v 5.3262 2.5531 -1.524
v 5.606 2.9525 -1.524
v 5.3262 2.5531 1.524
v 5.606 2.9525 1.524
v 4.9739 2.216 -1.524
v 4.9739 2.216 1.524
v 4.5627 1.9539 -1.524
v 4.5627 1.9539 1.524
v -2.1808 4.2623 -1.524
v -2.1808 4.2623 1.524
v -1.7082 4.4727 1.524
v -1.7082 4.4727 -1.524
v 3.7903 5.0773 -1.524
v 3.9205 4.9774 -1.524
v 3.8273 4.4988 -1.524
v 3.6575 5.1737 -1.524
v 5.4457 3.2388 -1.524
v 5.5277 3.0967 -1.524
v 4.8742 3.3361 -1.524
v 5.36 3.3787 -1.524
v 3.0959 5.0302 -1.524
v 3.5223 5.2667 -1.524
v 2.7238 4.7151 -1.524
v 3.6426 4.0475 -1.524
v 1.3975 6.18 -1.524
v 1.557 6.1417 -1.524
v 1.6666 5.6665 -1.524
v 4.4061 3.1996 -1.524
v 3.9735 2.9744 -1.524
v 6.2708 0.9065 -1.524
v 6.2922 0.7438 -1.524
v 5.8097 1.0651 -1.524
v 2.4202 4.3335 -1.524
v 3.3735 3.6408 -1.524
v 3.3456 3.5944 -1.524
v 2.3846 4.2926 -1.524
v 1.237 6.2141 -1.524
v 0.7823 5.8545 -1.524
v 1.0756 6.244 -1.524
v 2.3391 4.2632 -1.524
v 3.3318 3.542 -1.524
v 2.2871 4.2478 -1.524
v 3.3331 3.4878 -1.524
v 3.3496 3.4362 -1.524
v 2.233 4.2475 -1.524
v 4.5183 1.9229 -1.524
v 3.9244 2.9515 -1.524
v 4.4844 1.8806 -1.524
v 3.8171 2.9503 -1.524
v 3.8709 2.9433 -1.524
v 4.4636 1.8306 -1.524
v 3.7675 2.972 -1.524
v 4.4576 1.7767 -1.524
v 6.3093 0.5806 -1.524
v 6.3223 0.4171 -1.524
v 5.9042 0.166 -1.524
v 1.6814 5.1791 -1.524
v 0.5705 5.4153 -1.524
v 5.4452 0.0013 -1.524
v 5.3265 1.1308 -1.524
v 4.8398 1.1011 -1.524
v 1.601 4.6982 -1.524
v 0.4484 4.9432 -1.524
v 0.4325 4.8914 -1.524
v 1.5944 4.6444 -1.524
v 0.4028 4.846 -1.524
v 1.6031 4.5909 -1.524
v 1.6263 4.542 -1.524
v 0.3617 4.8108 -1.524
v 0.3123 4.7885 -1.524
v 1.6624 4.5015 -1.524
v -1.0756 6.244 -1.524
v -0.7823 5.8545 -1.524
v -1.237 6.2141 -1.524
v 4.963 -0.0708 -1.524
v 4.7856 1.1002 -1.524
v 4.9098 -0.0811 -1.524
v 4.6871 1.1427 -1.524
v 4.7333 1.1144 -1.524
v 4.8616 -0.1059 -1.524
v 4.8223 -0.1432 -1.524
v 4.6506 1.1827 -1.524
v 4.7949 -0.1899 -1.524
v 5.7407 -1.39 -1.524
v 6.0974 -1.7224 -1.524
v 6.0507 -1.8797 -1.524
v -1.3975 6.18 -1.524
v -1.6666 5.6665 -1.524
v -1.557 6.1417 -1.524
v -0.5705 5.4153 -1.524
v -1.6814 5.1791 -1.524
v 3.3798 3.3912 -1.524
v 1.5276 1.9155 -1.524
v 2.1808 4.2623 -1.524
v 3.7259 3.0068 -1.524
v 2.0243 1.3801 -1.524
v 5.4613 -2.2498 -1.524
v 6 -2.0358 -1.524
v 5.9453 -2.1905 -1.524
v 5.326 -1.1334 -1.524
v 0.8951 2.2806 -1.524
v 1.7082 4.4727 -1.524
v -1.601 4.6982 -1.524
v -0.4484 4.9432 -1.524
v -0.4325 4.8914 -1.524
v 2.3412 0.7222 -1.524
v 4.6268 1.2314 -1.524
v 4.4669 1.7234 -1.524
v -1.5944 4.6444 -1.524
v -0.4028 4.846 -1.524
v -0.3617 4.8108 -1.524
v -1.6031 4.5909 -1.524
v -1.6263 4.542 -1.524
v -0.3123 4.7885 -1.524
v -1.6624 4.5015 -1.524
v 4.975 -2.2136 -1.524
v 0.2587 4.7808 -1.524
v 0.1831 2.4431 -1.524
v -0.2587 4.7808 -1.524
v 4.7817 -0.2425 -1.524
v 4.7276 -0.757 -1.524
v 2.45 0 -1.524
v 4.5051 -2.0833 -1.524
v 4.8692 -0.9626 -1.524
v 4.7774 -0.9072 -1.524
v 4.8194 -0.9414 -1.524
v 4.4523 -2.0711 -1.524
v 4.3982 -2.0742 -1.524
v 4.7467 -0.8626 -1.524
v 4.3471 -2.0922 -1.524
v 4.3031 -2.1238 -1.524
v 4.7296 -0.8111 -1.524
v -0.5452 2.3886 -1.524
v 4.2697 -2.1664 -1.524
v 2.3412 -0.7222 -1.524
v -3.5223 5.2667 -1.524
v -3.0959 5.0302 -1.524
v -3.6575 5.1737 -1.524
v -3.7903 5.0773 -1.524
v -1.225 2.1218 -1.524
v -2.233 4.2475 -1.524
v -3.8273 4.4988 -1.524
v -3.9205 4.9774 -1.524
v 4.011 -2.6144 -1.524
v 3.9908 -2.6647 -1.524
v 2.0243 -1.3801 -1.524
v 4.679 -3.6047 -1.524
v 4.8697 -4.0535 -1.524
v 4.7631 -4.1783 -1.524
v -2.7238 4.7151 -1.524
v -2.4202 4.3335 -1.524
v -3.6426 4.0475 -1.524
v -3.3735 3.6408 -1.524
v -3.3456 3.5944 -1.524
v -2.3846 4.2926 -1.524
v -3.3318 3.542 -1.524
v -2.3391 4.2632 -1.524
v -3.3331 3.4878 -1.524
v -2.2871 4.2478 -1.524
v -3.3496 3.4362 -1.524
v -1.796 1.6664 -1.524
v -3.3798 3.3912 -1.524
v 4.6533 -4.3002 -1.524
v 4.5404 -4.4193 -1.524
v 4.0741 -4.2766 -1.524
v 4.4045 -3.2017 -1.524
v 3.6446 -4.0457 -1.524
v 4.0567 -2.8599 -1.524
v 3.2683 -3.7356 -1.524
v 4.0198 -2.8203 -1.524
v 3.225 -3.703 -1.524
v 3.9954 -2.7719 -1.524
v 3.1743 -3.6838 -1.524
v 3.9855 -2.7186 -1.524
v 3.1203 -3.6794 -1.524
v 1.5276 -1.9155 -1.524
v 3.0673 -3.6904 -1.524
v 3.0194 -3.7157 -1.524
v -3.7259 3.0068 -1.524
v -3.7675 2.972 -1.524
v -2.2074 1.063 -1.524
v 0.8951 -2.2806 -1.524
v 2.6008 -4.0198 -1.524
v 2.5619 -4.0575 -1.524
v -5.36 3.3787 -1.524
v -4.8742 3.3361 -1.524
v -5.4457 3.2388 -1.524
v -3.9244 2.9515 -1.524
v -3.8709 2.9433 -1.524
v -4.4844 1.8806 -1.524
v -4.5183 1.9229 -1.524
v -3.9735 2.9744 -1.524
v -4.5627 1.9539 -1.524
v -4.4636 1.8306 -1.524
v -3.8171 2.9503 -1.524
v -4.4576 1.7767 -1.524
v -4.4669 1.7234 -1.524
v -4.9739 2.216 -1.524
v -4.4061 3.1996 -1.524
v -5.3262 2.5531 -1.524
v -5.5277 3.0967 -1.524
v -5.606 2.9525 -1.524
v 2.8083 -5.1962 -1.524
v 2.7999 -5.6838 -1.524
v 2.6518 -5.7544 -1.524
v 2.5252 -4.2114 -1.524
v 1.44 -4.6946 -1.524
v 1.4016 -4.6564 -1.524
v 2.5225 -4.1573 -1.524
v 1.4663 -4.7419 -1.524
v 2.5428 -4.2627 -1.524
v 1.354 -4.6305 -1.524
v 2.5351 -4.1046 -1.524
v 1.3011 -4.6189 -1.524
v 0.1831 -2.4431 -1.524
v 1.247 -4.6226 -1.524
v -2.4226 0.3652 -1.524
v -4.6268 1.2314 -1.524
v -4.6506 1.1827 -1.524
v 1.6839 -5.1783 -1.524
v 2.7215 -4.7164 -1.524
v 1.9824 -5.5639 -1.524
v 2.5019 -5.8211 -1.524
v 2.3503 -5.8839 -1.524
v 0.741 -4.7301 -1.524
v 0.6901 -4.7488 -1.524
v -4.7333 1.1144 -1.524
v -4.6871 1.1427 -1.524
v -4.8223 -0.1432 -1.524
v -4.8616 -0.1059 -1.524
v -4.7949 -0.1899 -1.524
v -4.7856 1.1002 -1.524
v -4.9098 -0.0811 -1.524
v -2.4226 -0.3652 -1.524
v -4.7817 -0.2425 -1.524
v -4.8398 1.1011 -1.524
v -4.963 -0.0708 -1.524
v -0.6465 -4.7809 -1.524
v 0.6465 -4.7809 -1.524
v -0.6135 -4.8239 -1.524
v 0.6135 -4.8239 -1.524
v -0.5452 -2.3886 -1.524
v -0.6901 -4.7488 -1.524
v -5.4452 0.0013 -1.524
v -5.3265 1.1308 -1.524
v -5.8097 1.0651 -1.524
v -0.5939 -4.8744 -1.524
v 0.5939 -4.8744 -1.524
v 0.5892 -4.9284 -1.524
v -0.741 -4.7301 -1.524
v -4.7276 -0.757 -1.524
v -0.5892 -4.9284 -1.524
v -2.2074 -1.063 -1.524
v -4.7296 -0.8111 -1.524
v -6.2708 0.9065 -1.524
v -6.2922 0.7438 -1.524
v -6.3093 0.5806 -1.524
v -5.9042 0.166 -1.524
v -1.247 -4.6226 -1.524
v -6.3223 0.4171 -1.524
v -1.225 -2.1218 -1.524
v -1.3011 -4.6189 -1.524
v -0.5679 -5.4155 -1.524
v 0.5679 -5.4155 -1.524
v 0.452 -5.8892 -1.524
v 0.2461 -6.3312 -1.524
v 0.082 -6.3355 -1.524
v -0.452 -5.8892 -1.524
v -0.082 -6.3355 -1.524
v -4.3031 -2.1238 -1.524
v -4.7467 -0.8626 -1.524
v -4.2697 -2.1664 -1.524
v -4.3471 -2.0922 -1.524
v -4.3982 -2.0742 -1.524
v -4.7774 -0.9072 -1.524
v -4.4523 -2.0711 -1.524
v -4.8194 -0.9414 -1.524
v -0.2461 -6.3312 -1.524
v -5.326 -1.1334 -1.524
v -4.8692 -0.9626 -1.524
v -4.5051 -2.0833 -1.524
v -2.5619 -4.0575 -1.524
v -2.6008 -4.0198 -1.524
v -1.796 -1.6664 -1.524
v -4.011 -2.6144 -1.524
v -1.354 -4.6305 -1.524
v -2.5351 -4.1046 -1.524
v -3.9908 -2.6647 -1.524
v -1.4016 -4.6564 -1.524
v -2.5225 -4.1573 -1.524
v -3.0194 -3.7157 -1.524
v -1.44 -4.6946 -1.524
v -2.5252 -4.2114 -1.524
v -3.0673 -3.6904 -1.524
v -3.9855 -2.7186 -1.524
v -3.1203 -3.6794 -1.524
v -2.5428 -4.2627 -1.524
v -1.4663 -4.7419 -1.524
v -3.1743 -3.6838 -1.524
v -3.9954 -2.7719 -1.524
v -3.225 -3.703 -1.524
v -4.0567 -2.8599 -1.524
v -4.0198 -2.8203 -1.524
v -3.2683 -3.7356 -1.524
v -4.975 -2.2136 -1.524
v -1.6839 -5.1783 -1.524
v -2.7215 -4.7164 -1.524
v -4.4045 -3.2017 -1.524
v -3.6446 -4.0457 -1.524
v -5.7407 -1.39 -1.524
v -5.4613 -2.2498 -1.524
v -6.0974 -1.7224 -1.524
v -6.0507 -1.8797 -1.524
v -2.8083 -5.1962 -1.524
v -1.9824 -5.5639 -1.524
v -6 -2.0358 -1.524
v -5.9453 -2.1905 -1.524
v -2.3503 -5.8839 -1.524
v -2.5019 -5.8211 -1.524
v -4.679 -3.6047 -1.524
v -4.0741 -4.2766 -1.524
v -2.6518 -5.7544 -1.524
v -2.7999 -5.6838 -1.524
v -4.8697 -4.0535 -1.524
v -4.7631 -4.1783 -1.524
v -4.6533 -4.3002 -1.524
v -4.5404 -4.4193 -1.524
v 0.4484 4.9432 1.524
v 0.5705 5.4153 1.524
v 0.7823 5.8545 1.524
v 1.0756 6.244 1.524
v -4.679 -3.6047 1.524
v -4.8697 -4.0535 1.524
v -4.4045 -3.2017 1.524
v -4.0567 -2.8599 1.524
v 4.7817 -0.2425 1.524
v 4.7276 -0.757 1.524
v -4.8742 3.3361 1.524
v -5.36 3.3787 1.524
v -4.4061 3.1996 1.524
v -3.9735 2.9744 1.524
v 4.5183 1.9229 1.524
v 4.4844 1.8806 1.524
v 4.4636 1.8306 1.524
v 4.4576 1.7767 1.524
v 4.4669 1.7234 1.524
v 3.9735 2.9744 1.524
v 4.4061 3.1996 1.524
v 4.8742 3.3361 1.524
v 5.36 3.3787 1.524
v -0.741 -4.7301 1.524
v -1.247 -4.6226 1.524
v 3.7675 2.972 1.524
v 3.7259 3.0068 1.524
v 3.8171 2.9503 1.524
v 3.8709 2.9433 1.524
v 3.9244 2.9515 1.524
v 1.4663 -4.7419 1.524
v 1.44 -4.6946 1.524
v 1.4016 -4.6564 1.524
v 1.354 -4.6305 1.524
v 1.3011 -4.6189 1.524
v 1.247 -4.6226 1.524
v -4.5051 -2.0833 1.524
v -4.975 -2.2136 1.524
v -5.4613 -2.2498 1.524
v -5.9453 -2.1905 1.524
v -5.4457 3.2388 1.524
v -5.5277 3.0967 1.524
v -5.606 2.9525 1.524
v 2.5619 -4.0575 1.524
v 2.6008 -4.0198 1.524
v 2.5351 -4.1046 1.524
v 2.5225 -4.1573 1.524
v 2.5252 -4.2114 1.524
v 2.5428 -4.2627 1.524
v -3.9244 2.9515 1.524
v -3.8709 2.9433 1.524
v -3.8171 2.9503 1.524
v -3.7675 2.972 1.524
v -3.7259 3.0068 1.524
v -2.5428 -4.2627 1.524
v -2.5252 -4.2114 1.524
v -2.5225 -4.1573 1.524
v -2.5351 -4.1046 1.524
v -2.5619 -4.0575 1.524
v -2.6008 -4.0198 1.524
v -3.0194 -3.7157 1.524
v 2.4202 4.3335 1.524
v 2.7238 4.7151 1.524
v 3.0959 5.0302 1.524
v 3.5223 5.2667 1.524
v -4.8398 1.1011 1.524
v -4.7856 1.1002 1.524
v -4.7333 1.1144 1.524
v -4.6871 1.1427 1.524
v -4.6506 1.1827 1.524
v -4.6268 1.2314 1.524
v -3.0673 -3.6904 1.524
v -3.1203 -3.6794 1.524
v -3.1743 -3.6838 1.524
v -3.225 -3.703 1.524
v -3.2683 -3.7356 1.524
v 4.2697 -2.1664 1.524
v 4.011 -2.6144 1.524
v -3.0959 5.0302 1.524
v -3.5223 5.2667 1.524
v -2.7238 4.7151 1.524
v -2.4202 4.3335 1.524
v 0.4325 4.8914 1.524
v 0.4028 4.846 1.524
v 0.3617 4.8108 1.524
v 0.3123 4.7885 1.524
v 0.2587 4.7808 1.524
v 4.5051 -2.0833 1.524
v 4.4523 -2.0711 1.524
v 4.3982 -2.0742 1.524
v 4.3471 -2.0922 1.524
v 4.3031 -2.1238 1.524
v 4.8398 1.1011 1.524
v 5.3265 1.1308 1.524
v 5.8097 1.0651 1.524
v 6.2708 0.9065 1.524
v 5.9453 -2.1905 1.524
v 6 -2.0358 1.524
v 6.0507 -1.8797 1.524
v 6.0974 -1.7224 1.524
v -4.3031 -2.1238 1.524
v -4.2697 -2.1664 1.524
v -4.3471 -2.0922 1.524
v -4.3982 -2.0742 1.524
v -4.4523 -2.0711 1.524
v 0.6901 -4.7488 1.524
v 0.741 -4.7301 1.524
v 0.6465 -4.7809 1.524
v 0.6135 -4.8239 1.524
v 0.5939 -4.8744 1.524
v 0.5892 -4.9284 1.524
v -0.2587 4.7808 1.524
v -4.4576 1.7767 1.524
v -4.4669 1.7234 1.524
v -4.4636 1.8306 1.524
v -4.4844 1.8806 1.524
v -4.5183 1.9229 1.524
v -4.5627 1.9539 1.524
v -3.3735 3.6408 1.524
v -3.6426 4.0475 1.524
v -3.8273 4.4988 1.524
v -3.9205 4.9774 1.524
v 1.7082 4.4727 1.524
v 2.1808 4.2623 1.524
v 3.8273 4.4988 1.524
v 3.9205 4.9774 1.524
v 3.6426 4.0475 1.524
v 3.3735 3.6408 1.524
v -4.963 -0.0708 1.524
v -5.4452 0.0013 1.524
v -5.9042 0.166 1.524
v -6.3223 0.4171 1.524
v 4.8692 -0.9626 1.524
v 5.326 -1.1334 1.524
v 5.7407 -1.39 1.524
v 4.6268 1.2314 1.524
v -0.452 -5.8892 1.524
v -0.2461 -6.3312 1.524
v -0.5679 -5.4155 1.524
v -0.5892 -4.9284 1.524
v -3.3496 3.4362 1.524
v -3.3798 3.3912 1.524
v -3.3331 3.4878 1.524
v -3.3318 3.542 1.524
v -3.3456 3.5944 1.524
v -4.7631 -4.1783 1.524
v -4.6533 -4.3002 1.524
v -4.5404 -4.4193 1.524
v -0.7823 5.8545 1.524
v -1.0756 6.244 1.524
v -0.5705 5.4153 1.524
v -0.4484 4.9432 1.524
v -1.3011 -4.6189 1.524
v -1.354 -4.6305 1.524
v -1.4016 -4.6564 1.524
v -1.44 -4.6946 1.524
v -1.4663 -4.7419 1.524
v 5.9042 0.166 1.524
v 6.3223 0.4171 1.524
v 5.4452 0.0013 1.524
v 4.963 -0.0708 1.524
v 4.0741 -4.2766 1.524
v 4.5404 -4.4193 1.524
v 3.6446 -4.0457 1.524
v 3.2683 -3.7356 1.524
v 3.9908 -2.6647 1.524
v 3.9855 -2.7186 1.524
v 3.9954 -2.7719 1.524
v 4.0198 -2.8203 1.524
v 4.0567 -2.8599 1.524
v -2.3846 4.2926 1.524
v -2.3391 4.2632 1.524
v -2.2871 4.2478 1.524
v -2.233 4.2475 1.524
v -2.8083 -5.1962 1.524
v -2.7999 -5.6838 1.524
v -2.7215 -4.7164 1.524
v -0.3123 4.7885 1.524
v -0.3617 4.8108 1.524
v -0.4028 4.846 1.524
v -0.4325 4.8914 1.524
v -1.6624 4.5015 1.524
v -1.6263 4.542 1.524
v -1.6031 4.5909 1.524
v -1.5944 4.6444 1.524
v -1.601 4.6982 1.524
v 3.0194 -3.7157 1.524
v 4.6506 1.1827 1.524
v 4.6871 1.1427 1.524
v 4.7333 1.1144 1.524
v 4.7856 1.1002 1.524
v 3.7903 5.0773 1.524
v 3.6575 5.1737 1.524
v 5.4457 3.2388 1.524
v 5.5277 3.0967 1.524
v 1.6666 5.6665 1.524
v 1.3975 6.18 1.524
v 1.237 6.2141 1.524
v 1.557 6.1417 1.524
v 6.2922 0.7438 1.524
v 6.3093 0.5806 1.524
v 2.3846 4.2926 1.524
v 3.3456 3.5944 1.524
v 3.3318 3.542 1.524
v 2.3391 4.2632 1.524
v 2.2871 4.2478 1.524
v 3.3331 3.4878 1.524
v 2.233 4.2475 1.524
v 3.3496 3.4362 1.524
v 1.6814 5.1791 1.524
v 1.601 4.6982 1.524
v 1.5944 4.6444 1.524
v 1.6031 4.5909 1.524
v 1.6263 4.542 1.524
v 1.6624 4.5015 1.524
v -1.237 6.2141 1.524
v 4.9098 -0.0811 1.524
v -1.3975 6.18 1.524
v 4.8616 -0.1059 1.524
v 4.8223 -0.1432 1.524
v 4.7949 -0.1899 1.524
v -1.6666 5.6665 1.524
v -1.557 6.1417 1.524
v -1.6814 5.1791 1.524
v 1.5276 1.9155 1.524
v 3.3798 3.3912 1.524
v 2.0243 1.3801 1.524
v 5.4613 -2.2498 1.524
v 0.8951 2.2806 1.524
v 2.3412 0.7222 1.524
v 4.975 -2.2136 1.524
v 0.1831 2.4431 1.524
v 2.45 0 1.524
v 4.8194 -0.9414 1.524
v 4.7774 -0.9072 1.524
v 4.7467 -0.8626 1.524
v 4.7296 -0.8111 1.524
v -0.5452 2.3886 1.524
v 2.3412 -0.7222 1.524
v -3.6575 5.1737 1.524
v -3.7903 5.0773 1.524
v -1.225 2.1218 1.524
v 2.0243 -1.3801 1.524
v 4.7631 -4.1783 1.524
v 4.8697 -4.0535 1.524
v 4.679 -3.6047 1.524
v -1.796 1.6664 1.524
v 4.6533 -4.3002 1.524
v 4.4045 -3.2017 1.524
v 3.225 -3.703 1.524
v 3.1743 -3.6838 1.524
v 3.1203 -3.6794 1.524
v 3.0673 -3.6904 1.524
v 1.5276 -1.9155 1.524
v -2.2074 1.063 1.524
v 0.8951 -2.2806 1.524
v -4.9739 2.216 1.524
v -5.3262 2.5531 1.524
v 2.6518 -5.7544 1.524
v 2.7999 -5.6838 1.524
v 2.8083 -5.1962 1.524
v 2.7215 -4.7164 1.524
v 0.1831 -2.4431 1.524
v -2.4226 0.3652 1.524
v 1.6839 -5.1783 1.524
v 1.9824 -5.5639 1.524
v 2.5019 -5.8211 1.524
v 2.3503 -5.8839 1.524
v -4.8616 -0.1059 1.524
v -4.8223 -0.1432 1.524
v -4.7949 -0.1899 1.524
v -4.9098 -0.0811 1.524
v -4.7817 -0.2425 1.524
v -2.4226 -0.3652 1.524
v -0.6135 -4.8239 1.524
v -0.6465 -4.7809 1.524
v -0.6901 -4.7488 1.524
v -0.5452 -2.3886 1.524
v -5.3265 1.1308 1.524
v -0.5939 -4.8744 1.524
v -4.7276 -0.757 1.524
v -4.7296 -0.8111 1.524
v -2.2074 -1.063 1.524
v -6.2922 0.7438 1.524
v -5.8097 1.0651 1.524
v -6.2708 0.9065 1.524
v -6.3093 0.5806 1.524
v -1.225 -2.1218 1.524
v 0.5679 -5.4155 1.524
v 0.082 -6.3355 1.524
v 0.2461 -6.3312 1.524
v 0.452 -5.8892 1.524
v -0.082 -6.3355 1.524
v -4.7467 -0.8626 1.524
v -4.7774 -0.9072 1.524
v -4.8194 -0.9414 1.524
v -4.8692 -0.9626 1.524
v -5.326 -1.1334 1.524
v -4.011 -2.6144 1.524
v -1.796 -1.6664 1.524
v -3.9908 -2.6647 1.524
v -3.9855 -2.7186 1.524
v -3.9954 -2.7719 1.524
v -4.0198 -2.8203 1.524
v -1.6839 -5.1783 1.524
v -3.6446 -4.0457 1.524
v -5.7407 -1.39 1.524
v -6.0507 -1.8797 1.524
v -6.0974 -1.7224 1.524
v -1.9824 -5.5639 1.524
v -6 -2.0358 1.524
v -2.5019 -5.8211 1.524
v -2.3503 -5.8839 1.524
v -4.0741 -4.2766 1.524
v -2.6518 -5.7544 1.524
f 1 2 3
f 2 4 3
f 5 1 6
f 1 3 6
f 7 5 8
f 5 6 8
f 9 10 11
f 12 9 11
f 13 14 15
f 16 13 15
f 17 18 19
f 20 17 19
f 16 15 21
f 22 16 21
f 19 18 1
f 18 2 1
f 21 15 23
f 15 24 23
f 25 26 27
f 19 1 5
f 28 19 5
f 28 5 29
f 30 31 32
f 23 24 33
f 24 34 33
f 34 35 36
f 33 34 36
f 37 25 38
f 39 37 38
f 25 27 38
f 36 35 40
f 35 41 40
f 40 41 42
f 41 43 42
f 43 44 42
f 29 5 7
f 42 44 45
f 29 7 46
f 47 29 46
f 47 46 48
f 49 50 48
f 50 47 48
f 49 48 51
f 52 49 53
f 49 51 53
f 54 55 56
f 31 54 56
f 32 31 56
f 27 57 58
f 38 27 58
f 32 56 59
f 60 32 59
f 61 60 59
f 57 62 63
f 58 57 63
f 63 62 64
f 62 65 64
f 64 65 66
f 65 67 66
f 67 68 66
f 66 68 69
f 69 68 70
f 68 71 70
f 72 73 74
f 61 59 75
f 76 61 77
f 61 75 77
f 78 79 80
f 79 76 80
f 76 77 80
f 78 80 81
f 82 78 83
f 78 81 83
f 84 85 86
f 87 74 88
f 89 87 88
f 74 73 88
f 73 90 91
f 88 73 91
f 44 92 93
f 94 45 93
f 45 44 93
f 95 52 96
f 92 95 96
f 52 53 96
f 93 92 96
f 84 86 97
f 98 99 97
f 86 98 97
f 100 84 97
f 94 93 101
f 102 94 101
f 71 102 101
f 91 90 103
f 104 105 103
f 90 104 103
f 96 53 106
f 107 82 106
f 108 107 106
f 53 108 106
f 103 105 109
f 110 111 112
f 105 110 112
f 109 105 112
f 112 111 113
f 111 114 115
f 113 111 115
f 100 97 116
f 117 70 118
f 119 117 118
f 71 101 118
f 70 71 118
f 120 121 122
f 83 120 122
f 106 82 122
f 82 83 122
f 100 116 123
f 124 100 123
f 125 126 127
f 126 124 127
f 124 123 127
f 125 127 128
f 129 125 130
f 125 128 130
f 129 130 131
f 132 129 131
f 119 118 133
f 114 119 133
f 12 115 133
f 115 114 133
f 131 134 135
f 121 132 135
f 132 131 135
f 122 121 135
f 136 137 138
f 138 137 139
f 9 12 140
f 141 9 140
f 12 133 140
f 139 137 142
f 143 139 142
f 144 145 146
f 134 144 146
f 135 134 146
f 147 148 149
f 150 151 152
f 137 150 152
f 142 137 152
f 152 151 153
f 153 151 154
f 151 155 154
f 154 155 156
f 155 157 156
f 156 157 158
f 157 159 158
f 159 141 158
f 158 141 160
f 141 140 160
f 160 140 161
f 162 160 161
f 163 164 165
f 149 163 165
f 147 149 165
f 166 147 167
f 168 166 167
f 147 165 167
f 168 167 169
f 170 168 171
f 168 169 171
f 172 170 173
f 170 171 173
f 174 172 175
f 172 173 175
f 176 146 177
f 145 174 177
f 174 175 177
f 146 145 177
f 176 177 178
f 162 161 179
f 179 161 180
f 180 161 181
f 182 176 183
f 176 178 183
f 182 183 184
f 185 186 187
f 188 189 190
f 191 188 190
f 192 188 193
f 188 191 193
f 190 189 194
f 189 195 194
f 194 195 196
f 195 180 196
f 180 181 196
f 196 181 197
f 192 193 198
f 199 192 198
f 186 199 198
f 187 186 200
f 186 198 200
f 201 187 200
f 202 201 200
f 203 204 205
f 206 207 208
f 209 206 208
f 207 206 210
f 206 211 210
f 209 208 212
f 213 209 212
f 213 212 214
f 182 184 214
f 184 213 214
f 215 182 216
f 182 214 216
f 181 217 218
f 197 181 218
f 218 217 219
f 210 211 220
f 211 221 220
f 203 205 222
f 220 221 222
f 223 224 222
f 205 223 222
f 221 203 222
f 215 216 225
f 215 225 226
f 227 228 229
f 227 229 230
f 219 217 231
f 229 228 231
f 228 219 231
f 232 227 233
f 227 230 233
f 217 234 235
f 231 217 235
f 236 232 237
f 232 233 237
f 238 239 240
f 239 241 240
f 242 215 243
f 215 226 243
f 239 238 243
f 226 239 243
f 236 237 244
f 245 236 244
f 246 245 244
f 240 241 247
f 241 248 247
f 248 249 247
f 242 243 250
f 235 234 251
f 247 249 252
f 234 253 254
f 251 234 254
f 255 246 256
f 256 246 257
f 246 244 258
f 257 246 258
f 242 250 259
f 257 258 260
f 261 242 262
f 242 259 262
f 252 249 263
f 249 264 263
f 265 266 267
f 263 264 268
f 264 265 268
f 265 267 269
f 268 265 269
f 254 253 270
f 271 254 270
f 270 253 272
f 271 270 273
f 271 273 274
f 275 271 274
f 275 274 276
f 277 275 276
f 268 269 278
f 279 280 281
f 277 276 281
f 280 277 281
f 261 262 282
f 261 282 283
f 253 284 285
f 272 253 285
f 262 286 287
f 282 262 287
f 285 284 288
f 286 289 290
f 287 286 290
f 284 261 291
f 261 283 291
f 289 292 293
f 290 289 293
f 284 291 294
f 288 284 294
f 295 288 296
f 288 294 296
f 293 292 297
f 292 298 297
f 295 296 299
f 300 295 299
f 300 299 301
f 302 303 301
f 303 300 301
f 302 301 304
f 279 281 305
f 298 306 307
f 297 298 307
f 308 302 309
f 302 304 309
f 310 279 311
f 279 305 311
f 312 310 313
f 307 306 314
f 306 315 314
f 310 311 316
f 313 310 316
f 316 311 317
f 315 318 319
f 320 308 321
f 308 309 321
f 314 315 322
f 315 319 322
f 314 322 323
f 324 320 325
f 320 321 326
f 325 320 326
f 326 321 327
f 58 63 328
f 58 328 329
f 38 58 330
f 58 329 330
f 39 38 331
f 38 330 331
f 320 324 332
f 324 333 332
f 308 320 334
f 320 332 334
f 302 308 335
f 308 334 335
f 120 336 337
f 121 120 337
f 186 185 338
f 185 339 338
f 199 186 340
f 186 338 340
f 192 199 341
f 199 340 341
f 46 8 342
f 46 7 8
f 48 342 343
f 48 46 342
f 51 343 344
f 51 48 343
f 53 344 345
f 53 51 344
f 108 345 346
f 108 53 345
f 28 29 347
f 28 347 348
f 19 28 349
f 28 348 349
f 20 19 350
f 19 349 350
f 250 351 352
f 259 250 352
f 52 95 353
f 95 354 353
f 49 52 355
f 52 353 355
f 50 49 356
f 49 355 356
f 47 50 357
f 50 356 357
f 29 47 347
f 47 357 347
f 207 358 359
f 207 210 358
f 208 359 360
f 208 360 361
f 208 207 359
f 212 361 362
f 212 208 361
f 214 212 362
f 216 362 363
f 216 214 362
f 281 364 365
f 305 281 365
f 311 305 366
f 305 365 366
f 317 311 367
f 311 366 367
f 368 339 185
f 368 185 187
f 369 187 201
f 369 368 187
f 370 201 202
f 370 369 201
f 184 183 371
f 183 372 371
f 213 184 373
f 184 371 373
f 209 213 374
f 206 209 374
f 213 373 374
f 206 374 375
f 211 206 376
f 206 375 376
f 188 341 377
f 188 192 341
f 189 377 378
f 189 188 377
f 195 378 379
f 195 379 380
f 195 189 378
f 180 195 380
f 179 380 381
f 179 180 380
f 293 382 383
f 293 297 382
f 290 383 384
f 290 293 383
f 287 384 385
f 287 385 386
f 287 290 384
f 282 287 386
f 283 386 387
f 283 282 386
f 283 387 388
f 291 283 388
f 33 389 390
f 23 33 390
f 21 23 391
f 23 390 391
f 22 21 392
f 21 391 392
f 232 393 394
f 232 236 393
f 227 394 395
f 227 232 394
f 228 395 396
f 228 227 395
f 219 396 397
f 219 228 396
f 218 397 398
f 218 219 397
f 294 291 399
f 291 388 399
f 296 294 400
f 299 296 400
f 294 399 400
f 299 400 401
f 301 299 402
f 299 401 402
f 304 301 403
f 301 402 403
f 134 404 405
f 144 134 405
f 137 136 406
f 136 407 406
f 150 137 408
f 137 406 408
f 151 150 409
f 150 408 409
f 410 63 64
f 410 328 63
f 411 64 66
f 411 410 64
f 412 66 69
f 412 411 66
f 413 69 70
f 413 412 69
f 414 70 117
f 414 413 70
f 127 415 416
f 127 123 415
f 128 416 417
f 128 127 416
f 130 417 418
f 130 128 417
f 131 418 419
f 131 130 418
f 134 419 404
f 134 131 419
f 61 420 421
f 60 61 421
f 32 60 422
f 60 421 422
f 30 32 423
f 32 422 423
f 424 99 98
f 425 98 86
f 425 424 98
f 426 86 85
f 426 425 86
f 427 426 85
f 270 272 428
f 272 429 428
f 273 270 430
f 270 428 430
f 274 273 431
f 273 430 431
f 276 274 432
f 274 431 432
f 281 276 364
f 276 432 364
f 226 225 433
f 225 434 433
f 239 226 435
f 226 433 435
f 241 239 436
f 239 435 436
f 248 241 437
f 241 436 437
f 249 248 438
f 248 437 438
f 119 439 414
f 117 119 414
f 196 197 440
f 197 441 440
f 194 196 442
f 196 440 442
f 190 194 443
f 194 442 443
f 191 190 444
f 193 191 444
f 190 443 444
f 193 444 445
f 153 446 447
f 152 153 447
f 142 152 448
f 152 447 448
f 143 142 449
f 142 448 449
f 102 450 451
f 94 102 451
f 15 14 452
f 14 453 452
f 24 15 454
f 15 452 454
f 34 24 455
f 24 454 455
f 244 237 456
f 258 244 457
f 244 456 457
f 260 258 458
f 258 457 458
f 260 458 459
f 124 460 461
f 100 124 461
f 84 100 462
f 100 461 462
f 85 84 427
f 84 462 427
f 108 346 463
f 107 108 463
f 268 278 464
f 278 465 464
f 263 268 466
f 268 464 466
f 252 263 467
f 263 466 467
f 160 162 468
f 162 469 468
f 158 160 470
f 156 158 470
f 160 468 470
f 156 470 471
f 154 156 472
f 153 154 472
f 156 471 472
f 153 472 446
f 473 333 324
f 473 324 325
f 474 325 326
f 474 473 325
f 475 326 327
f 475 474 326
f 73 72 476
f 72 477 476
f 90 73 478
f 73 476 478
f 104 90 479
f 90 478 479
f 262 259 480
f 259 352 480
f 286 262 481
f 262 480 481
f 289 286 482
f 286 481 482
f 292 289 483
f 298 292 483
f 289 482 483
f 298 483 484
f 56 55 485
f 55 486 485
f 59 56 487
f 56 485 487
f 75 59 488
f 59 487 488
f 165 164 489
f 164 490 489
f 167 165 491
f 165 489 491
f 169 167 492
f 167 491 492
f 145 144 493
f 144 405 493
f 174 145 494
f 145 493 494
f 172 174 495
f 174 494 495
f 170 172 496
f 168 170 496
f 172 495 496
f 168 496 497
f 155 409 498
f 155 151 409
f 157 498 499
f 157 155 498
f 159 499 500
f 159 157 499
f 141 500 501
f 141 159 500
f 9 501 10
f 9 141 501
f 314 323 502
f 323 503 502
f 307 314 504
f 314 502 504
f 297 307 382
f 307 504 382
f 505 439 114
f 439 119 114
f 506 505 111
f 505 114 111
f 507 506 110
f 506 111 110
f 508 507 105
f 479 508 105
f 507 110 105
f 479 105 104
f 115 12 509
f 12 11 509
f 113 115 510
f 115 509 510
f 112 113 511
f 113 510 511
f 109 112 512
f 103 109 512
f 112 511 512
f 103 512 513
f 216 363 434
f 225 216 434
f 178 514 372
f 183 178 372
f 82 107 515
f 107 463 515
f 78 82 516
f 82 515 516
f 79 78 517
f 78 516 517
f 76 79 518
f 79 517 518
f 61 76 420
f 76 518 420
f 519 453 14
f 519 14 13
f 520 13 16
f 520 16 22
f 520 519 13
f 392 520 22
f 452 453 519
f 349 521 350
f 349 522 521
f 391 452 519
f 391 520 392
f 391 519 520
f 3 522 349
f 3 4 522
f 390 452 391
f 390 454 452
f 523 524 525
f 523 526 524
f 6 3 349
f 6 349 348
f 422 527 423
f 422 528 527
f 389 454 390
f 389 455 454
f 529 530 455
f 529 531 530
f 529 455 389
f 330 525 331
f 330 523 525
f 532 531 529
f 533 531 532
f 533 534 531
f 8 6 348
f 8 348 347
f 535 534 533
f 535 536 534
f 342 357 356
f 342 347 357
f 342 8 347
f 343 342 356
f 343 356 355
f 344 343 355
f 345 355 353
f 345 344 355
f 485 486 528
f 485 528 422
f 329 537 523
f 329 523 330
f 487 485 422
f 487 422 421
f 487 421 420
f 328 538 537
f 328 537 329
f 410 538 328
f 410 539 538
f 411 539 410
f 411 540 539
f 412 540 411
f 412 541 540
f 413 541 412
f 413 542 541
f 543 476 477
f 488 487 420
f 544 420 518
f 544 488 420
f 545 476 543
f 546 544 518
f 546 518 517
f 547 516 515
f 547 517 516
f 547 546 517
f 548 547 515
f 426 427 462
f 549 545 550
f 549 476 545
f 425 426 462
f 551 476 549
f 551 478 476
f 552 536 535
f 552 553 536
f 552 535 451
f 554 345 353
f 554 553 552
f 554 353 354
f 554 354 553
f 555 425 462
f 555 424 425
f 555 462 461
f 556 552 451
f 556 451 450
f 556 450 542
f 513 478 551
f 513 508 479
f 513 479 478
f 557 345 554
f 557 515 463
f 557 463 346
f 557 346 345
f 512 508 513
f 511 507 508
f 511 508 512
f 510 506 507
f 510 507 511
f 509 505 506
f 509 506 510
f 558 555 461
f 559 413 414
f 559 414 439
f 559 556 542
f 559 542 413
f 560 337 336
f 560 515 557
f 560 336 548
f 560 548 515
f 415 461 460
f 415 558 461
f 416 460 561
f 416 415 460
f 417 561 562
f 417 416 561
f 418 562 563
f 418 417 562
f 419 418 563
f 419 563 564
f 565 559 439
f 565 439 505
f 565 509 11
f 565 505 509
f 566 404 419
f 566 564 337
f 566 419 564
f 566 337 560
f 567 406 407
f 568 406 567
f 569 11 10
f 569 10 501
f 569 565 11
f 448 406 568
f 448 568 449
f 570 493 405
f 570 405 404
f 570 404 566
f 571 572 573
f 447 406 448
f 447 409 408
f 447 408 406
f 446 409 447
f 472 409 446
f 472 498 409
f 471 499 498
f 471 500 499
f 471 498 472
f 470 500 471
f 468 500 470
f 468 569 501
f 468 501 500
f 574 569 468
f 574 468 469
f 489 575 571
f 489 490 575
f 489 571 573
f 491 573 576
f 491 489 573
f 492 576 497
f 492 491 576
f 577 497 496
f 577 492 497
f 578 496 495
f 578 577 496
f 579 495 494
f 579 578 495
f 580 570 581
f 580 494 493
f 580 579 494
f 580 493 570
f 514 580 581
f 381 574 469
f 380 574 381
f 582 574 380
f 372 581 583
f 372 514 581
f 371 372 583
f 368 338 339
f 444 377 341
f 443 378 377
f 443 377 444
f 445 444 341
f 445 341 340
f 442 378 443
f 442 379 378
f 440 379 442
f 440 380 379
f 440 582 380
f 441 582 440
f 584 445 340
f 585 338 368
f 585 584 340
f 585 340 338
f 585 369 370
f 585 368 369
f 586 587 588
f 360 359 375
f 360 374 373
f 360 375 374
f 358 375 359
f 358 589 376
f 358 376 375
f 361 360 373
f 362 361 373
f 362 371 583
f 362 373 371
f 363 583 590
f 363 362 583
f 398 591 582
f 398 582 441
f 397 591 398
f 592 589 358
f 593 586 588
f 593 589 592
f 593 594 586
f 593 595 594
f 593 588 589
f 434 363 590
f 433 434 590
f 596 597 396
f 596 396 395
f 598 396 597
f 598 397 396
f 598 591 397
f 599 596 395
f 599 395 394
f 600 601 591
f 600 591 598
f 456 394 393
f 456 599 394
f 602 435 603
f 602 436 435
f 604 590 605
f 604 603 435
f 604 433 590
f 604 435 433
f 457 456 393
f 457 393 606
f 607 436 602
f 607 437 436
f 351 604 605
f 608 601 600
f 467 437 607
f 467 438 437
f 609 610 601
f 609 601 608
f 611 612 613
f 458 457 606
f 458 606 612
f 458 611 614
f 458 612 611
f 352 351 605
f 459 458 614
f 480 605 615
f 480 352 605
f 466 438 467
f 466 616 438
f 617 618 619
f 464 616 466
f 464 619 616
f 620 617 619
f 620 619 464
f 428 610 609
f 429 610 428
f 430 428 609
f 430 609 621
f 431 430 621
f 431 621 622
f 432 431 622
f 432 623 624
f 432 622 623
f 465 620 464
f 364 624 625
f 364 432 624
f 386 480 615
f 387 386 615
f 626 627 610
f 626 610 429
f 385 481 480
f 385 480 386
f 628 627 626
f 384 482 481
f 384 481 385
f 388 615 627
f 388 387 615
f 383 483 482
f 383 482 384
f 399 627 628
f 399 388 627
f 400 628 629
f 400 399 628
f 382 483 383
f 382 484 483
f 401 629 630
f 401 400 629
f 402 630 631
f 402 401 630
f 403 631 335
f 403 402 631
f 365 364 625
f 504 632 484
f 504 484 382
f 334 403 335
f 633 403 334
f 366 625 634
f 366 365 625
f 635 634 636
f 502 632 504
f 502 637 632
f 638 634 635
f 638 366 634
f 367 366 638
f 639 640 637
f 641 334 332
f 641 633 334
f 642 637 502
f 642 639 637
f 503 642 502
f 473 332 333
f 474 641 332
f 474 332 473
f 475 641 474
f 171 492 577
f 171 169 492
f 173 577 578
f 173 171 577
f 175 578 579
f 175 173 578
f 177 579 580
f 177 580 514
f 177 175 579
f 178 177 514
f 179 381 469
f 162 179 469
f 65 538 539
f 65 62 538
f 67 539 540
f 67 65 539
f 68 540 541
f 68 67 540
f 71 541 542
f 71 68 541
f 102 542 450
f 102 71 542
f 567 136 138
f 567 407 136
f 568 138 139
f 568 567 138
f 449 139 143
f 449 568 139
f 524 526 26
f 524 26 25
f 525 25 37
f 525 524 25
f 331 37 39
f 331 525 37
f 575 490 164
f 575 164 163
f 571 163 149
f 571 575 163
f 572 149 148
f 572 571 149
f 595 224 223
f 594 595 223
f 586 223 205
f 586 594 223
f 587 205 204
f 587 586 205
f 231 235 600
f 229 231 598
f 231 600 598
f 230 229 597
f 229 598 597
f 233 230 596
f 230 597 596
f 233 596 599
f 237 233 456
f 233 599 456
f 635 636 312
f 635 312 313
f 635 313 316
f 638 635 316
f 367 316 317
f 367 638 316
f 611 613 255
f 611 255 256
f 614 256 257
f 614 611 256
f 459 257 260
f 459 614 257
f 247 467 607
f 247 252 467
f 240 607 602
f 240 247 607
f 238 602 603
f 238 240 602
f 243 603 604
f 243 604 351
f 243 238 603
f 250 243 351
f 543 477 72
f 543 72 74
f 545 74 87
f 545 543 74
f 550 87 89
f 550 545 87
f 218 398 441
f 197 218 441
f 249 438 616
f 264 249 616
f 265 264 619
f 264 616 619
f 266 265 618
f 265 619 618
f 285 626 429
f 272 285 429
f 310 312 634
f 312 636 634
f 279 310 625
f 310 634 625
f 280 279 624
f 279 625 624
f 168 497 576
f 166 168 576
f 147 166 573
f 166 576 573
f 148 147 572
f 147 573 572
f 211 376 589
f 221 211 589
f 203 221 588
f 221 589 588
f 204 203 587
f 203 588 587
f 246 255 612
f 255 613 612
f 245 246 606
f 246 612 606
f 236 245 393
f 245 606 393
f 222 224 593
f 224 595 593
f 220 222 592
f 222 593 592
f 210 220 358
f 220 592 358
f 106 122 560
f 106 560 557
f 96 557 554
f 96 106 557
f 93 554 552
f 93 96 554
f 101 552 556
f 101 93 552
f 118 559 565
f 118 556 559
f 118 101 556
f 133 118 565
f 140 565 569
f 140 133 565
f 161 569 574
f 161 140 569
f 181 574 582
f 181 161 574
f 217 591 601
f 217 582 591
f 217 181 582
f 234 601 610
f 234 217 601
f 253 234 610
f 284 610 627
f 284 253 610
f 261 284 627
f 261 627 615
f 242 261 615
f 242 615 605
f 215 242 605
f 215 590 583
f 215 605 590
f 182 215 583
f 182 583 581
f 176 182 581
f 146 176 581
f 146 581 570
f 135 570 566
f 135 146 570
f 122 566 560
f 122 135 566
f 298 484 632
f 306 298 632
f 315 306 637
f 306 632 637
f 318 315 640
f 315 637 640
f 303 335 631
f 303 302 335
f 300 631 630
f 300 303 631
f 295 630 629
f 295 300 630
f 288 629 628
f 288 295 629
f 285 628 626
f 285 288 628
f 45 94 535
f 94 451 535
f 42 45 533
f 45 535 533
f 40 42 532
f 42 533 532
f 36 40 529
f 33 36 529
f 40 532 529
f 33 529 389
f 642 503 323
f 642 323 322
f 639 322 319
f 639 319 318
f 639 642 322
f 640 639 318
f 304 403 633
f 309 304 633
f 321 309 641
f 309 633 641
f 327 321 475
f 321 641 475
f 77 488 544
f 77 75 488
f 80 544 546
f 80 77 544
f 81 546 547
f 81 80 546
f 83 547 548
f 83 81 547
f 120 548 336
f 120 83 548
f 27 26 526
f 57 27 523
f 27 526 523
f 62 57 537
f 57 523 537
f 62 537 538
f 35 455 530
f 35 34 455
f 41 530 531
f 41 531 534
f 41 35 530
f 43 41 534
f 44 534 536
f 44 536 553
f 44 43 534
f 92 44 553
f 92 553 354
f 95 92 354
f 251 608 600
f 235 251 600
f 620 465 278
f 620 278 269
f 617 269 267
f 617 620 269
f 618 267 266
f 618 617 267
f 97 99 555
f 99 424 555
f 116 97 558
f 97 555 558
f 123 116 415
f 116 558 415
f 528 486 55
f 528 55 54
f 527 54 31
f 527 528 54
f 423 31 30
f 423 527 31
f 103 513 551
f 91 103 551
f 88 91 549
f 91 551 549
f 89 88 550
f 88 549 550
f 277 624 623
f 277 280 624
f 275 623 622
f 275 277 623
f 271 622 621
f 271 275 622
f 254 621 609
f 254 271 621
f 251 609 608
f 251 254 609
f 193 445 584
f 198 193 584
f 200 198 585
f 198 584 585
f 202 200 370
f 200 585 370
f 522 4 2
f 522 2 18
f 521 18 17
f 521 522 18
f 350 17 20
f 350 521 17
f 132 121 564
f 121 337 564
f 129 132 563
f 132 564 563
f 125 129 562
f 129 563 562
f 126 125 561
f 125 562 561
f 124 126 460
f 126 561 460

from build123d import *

# Parameters (mm, degrees)
SKETCH1_R                = 6.335999901
BOSS_EXTRUDE1_DEPTH      = 1.524
CUT_EXTRUDE1_DEPTH       = 10.089134474
FILLET1_R                = 0.191999997
CIRPATTERN1_COUNT        = 15
FILLET1_OF_CIRPATTERN1_R = 0.191999997
CUT_EXTRUDE2_DEPTH       = 10.455482489
CUT_EXTRUDE2_DEPTH_BACK  = 10.455482489
SKETCH4_R                = 2.45


with BuildPart() as part:
    # Sketch1 → Boss-Extrude1 (new, symmetric)
    with BuildSketch(Plane.XY):
        with Locations(Location((0, 0, 0), (0, 0, 180))):
            Circle(SKETCH1_R)
    extrude(amount=BOSS_EXTRUDE1_DEPTH, both=True)

    # Sketch3 → Cut-Extrude1 (cut, symmetric)
    with BuildSketch(Plane.XY):
        with BuildLine():
            Line((-0.428414679, 4.780843037), (0.428414679, 4.780843037))
            ThreePointArc((0.428414679, 4.780843037), (1.010780942, 6.170659573), (2.288190337, 6.970012879))
            ThreePointArc((2.288190337, 6.970012879), (0, 7.335999901), (-2.288190337, 6.970012879))
            ThreePointArc((-2.288190337, 6.970012879), (-1.010780942, 6.170659573), (-0.428414679, 4.780843037))
        make_face()
    cut_extrude1 = extrude(amount=CUT_EXTRUDE1_DEPTH, both=True, mode=Mode.SUBTRACT)

    # Fillet1
    fillet1_edges = [part.edges().sort_by_distance(p)[0] for p in [
        (-0.428414679, 4.780843037, 0),
        (0.428414679, 4.780843037, 0),
    ]]
    fillet(fillet1_edges, radius=FILLET1_R)

    # CirPattern1: Cut-Extrude1 ×15 about axis
    cirpattern1_axis = Axis((0, 0, 0), (0, 0, 1))
    for i in range(1, CIRPATTERN1_COUNT):
        add(cut_extrude1.rotate(cirpattern1_axis, i * 360 / CIRPATTERN1_COUNT), mode=Mode.SUBTRACT)

    # Fillet1 of CirPattern1
    fillet1_of_cirpattern1_edges = [part.edges().sort_by_distance(p)[0] for p in [
        (-2.335920332, 4.193265492, 0),
        (-1.553167764, 4.541769388, 0),
        (-3.839524138, 2.880634248, 0),
        (-3.26619339, 3.517382552, 0),
        (-4.67923934, 1.069915174, 0),
        (-4.414464507, 1.884808318, 0),
        (-4.70987155, -0.925801954, 0),
        (-4.799434606, -0.073666397, 0),
        (-3.926124182, -2.761439514, 0),
        (-4.354538861, -2.019403523, 0),
        (-2.463514275, -4.119599094, 0),
        (-3.156703787, -3.615967434, 0),
        (-0.574940369, -4.765442566, 0),
        (-1.41304595, -4.587297726, 0),
        (1.41304595, -4.587297726, 0),
        (0.574940369, -4.765442566, 0),
        (3.156703787, -3.615967434, 0),
        (2.463514275, -4.119599094, 0),
        (4.354538861, -2.019403523, 0),
        (3.926124182, -2.761439514, 0),
        (4.799434606, -0.073666397, 0),
        (4.70987155, -0.925801954, 0),
        (4.414464507, 1.884808318, 0),
        (4.67923934, 1.069915174, 0),
        (3.26619339, 3.517382552, 0),
        (3.839524138, 2.880634248, 0),
        (1.553167764, 4.541769388, 0),
        (2.335920332, 4.193265492, 0),
    ]]
    fillet(fillet1_of_cirpattern1_edges, radius=FILLET1_OF_CIRPATTERN1_R)

    # Sketch4 → Cut-Extrude2 (cut, two sides: drawn at the far end of the back side and taken through both)
    with BuildSketch(Plane.XY.offset(1.524).offset(-CUT_EXTRUDE2_DEPTH_BACK)):
        Circle(SKETCH4_R)
    extrude(amount=CUT_EXTRUDE2_DEPTH + CUT_EXTRUDE2_DEPTH_BACK, mode=Mode.SUBTRACT)


solid = part.part
